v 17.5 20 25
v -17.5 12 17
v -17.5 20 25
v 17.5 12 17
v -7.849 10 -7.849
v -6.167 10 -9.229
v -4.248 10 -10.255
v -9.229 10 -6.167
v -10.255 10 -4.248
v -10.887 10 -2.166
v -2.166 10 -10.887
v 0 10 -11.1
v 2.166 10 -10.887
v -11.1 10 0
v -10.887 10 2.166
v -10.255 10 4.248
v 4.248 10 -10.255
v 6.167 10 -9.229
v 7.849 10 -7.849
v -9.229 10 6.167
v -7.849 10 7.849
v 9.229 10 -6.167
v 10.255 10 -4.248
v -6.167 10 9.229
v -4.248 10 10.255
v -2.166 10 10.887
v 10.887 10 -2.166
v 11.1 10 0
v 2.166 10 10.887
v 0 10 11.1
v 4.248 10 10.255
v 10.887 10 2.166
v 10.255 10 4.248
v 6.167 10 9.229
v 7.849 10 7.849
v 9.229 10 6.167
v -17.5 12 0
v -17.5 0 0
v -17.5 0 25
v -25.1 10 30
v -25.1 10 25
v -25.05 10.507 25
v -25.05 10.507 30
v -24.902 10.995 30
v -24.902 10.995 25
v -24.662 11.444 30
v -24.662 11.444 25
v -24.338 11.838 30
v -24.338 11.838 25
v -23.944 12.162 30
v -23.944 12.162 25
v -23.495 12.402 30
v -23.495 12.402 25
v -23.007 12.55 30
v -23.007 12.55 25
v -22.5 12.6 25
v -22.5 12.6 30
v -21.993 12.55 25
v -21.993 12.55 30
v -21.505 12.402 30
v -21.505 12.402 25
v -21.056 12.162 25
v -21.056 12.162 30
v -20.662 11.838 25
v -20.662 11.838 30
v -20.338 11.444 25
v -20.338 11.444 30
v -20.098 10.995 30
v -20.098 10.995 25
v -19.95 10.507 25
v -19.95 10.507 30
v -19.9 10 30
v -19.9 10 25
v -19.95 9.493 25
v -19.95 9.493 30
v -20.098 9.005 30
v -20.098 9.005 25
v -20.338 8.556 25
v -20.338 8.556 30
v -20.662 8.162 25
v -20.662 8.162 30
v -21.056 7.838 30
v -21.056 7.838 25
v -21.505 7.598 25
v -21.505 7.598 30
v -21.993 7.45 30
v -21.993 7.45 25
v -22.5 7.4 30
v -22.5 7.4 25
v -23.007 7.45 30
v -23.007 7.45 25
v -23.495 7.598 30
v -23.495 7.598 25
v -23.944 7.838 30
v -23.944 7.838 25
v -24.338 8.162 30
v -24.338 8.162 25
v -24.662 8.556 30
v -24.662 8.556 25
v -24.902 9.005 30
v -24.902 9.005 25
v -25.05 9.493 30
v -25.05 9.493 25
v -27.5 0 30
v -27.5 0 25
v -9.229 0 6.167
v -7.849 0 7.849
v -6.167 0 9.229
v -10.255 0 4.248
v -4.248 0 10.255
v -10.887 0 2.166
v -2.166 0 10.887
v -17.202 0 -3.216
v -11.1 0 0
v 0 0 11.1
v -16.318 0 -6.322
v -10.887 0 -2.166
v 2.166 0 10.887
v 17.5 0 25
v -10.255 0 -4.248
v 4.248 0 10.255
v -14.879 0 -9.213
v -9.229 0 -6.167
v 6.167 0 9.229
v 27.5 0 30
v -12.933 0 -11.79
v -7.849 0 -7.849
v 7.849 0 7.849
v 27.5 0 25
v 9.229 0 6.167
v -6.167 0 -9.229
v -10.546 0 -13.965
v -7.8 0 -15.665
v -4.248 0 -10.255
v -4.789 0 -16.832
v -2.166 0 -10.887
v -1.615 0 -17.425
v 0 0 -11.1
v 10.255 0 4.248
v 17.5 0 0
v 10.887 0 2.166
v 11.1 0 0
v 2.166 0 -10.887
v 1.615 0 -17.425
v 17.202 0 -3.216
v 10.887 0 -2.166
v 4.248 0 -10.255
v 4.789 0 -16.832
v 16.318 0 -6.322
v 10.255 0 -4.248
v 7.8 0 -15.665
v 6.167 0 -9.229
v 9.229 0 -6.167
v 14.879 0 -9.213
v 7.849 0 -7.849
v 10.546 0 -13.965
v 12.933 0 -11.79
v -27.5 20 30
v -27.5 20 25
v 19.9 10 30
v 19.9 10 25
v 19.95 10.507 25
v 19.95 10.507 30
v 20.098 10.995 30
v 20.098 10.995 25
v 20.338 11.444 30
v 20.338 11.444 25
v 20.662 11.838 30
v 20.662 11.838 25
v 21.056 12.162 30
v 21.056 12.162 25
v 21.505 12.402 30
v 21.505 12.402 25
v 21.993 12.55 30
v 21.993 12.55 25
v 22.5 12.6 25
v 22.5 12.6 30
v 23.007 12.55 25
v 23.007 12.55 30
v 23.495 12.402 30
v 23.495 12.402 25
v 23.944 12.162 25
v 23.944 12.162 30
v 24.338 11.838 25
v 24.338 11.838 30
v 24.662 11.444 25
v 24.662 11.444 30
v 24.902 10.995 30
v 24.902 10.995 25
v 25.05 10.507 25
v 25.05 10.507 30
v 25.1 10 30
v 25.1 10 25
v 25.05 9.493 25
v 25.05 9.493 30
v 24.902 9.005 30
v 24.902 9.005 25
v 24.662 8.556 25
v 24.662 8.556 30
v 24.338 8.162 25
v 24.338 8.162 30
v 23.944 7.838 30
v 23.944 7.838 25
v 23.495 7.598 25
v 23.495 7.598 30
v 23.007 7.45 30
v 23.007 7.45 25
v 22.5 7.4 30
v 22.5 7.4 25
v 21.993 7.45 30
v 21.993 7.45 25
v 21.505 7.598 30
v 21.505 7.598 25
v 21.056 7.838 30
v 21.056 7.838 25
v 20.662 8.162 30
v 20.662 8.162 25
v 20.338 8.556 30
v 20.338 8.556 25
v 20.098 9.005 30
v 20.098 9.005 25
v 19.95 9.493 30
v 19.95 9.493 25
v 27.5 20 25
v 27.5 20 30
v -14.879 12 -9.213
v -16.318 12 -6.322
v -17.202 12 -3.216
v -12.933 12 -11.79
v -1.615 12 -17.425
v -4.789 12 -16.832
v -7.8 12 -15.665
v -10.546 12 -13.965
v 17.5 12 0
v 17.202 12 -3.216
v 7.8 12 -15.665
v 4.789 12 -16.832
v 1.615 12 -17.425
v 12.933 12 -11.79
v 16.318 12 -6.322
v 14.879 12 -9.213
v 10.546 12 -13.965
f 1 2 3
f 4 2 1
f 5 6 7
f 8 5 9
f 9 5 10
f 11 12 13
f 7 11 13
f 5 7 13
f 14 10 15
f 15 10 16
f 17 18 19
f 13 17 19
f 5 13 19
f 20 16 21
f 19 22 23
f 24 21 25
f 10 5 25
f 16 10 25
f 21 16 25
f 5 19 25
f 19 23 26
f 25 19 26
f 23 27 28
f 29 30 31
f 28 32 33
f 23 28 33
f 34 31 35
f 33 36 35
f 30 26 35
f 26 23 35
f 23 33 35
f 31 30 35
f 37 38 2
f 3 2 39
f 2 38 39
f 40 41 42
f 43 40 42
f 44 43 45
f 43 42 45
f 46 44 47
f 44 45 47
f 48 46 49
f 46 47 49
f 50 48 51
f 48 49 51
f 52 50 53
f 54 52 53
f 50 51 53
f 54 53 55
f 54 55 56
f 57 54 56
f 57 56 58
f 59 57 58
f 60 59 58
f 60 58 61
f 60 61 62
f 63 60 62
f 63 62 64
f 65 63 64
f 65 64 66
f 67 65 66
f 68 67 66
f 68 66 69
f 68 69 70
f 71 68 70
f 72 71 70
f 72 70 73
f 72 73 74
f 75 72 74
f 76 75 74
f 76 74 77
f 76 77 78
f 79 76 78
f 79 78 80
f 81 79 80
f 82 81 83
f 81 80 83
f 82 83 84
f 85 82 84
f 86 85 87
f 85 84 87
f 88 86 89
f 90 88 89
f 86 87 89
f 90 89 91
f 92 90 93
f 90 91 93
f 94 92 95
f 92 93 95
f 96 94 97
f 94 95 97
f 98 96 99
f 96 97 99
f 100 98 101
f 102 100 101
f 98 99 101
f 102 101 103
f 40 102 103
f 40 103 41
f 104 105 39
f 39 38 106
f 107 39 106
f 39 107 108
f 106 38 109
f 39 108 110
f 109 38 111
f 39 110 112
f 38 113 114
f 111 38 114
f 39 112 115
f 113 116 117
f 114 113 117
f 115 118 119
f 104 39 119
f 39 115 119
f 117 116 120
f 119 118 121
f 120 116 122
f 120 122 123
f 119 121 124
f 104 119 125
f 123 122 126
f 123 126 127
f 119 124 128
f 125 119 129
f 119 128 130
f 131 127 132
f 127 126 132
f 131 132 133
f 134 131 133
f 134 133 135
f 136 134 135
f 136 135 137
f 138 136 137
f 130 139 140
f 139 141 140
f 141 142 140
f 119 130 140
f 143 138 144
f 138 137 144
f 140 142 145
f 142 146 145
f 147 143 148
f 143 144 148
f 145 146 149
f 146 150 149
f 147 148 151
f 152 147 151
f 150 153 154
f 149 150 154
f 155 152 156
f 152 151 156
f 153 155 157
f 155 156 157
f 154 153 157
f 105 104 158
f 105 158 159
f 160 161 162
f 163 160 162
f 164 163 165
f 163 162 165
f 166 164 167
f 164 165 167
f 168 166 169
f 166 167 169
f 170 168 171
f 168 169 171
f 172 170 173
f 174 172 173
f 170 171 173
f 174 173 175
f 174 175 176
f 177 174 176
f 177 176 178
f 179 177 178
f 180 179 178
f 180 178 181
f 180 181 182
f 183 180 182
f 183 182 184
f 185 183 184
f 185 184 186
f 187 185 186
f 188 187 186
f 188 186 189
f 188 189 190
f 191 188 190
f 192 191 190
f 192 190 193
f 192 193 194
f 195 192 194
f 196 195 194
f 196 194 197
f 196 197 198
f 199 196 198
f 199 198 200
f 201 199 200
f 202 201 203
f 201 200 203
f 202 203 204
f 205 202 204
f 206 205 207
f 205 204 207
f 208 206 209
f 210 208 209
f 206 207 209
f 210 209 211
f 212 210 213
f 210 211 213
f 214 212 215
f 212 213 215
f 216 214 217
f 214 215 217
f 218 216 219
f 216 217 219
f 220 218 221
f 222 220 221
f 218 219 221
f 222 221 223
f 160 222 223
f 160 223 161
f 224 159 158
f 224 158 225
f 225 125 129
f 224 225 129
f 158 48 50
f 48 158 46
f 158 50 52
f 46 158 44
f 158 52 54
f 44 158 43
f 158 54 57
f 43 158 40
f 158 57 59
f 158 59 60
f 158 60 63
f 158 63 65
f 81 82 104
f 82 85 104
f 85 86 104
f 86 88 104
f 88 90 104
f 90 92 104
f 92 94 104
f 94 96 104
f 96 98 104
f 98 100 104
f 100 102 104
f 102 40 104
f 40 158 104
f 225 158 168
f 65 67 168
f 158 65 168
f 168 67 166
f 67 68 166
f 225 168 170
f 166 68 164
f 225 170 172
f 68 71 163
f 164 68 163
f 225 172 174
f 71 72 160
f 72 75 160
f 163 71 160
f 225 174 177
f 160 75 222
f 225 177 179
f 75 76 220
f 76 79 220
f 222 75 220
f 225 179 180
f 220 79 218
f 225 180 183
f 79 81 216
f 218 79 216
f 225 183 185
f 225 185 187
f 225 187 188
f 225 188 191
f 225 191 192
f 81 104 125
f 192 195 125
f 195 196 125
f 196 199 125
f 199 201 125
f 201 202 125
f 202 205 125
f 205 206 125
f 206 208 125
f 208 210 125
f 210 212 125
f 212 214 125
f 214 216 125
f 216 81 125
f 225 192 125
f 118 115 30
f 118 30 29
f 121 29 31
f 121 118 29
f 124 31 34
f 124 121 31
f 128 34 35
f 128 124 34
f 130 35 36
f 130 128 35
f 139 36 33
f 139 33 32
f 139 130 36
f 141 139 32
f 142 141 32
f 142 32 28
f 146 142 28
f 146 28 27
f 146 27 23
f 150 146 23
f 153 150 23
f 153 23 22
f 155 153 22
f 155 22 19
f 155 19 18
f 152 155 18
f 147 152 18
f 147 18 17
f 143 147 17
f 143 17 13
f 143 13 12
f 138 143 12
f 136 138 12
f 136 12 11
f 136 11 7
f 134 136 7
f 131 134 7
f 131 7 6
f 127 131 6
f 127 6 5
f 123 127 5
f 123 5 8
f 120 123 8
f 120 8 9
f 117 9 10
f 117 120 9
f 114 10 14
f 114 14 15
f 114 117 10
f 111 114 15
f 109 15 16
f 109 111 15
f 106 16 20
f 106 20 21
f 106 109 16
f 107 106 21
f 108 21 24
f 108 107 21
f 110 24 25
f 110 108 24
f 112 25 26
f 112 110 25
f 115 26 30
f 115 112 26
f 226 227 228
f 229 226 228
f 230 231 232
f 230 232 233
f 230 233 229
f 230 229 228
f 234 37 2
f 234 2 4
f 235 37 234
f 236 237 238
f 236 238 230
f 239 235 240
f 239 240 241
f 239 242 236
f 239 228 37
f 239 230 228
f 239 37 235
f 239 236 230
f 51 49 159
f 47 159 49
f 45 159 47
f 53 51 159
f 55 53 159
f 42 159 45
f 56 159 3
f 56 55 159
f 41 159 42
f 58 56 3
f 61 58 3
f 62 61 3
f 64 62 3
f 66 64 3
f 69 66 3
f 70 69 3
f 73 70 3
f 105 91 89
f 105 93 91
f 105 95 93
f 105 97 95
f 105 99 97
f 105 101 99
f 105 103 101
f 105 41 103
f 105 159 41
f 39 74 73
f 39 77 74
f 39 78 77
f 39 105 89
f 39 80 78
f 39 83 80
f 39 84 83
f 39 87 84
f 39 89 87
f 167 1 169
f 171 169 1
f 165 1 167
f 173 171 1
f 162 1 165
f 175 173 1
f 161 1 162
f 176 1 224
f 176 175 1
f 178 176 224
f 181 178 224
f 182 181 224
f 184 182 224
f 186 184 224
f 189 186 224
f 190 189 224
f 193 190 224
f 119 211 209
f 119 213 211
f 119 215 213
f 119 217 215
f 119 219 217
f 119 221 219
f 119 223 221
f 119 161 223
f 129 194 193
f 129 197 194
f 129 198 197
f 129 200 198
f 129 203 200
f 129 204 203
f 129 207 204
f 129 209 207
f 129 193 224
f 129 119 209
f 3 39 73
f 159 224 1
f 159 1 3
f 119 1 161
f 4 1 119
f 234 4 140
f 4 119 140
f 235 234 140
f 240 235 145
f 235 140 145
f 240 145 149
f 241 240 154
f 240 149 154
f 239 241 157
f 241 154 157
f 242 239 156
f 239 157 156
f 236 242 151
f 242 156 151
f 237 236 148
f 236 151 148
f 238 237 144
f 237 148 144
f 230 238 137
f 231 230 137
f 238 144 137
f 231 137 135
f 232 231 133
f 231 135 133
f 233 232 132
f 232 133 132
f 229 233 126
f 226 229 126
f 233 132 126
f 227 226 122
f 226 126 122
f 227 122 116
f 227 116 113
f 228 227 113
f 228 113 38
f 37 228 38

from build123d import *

# Parameters (mm, degrees)
SKETCH1_R           = 11.1
BOSS_EXTRUDE1_DEPTH = 12
BOSS_EXTRUDE2_START = -2
SKETCH3_R           = 11.1
BOSS_EXTRUDE2_DEPTH = 2
SKETCH4_W           = 55
SKETCH4_H           = 5
BOSS_EXTRUDE3_DEPTH = 20
SKETCH5_R           = 2.6
CUT_EXTRUDE1_DEPTH  = 55.428852643
CHAMFER1_SIZE       = 8


with BuildPart() as part:
    # Sketch1 → Boss-Extrude1 (new body)
    with BuildSketch(Plane(origin=(0, 0, 0), x_dir=(1, 0, 0), z_dir=(0, 1, 0))):
        with BuildLine():
            Line((-17.5, 0), (-17.5, -25))
            Line((-17.5, -25), (17.5, -25))
            Line((17.5, -25), (17.5, 0))
            ThreePointArc((17.5, 0), (0, 17.5), (-17.5, 0))
        make_face()
        with Locations(Location((0, 0, 0), (0, 0, 270))):
            Circle(SKETCH1_R, mode=Mode.SUBTRACT)
    extrude(amount=BOSS_EXTRUDE1_DEPTH)

    # Sketch3 → Boss-Extrude2 (add)
    with BuildSketch(Plane(origin=(0, 12, 0), x_dir=(1, 0, 0), z_dir=(0, 1, 0)).offset(BOSS_EXTRUDE2_START)):
        with Locations(Location((0, 0, 0), (0, 0, 270))):
            Circle(SKETCH3_R)
    extrude(amount=BOSS_EXTRUDE2_DEPTH)

    # Sketch4 → Boss-Extrude3 (add)
    with BuildSketch(Plane(origin=(0, 0, 0), x_dir=(1, 0, 0), z_dir=(0, 1, 0))):
        with Locations((0, -27.5)):
            Rectangle(SKETCH4_W, SKETCH4_H)
    extrude(amount=BOSS_EXTRUDE3_DEPTH)

    # Sketch5 → Cut-Extrude1 (cut, through all)
    with BuildSketch(Plane(origin=(0, 0, 25), x_dir=(-1, 0, 0), z_dir=(0, 0, -1))):
        with Locations((22.5, 10)):
            Circle(SKETCH5_R)
        with Locations((-22.5, 10)):
            Circle(SKETCH5_R)
    extrude(amount=-CUT_EXTRUDE1_DEPTH, mode=Mode.SUBTRACT)

    # Chamfer1
    chamfer1_edges = [part.edges().sort_by_distance(p)[0] for p in [
        (0, 12, 25),
    ]]
    chamfer(chamfer1_edges, length=CHAMFER1_SIZE - 0.0001)  # a hair under: the kernel refuses the full size


solid = part.part
